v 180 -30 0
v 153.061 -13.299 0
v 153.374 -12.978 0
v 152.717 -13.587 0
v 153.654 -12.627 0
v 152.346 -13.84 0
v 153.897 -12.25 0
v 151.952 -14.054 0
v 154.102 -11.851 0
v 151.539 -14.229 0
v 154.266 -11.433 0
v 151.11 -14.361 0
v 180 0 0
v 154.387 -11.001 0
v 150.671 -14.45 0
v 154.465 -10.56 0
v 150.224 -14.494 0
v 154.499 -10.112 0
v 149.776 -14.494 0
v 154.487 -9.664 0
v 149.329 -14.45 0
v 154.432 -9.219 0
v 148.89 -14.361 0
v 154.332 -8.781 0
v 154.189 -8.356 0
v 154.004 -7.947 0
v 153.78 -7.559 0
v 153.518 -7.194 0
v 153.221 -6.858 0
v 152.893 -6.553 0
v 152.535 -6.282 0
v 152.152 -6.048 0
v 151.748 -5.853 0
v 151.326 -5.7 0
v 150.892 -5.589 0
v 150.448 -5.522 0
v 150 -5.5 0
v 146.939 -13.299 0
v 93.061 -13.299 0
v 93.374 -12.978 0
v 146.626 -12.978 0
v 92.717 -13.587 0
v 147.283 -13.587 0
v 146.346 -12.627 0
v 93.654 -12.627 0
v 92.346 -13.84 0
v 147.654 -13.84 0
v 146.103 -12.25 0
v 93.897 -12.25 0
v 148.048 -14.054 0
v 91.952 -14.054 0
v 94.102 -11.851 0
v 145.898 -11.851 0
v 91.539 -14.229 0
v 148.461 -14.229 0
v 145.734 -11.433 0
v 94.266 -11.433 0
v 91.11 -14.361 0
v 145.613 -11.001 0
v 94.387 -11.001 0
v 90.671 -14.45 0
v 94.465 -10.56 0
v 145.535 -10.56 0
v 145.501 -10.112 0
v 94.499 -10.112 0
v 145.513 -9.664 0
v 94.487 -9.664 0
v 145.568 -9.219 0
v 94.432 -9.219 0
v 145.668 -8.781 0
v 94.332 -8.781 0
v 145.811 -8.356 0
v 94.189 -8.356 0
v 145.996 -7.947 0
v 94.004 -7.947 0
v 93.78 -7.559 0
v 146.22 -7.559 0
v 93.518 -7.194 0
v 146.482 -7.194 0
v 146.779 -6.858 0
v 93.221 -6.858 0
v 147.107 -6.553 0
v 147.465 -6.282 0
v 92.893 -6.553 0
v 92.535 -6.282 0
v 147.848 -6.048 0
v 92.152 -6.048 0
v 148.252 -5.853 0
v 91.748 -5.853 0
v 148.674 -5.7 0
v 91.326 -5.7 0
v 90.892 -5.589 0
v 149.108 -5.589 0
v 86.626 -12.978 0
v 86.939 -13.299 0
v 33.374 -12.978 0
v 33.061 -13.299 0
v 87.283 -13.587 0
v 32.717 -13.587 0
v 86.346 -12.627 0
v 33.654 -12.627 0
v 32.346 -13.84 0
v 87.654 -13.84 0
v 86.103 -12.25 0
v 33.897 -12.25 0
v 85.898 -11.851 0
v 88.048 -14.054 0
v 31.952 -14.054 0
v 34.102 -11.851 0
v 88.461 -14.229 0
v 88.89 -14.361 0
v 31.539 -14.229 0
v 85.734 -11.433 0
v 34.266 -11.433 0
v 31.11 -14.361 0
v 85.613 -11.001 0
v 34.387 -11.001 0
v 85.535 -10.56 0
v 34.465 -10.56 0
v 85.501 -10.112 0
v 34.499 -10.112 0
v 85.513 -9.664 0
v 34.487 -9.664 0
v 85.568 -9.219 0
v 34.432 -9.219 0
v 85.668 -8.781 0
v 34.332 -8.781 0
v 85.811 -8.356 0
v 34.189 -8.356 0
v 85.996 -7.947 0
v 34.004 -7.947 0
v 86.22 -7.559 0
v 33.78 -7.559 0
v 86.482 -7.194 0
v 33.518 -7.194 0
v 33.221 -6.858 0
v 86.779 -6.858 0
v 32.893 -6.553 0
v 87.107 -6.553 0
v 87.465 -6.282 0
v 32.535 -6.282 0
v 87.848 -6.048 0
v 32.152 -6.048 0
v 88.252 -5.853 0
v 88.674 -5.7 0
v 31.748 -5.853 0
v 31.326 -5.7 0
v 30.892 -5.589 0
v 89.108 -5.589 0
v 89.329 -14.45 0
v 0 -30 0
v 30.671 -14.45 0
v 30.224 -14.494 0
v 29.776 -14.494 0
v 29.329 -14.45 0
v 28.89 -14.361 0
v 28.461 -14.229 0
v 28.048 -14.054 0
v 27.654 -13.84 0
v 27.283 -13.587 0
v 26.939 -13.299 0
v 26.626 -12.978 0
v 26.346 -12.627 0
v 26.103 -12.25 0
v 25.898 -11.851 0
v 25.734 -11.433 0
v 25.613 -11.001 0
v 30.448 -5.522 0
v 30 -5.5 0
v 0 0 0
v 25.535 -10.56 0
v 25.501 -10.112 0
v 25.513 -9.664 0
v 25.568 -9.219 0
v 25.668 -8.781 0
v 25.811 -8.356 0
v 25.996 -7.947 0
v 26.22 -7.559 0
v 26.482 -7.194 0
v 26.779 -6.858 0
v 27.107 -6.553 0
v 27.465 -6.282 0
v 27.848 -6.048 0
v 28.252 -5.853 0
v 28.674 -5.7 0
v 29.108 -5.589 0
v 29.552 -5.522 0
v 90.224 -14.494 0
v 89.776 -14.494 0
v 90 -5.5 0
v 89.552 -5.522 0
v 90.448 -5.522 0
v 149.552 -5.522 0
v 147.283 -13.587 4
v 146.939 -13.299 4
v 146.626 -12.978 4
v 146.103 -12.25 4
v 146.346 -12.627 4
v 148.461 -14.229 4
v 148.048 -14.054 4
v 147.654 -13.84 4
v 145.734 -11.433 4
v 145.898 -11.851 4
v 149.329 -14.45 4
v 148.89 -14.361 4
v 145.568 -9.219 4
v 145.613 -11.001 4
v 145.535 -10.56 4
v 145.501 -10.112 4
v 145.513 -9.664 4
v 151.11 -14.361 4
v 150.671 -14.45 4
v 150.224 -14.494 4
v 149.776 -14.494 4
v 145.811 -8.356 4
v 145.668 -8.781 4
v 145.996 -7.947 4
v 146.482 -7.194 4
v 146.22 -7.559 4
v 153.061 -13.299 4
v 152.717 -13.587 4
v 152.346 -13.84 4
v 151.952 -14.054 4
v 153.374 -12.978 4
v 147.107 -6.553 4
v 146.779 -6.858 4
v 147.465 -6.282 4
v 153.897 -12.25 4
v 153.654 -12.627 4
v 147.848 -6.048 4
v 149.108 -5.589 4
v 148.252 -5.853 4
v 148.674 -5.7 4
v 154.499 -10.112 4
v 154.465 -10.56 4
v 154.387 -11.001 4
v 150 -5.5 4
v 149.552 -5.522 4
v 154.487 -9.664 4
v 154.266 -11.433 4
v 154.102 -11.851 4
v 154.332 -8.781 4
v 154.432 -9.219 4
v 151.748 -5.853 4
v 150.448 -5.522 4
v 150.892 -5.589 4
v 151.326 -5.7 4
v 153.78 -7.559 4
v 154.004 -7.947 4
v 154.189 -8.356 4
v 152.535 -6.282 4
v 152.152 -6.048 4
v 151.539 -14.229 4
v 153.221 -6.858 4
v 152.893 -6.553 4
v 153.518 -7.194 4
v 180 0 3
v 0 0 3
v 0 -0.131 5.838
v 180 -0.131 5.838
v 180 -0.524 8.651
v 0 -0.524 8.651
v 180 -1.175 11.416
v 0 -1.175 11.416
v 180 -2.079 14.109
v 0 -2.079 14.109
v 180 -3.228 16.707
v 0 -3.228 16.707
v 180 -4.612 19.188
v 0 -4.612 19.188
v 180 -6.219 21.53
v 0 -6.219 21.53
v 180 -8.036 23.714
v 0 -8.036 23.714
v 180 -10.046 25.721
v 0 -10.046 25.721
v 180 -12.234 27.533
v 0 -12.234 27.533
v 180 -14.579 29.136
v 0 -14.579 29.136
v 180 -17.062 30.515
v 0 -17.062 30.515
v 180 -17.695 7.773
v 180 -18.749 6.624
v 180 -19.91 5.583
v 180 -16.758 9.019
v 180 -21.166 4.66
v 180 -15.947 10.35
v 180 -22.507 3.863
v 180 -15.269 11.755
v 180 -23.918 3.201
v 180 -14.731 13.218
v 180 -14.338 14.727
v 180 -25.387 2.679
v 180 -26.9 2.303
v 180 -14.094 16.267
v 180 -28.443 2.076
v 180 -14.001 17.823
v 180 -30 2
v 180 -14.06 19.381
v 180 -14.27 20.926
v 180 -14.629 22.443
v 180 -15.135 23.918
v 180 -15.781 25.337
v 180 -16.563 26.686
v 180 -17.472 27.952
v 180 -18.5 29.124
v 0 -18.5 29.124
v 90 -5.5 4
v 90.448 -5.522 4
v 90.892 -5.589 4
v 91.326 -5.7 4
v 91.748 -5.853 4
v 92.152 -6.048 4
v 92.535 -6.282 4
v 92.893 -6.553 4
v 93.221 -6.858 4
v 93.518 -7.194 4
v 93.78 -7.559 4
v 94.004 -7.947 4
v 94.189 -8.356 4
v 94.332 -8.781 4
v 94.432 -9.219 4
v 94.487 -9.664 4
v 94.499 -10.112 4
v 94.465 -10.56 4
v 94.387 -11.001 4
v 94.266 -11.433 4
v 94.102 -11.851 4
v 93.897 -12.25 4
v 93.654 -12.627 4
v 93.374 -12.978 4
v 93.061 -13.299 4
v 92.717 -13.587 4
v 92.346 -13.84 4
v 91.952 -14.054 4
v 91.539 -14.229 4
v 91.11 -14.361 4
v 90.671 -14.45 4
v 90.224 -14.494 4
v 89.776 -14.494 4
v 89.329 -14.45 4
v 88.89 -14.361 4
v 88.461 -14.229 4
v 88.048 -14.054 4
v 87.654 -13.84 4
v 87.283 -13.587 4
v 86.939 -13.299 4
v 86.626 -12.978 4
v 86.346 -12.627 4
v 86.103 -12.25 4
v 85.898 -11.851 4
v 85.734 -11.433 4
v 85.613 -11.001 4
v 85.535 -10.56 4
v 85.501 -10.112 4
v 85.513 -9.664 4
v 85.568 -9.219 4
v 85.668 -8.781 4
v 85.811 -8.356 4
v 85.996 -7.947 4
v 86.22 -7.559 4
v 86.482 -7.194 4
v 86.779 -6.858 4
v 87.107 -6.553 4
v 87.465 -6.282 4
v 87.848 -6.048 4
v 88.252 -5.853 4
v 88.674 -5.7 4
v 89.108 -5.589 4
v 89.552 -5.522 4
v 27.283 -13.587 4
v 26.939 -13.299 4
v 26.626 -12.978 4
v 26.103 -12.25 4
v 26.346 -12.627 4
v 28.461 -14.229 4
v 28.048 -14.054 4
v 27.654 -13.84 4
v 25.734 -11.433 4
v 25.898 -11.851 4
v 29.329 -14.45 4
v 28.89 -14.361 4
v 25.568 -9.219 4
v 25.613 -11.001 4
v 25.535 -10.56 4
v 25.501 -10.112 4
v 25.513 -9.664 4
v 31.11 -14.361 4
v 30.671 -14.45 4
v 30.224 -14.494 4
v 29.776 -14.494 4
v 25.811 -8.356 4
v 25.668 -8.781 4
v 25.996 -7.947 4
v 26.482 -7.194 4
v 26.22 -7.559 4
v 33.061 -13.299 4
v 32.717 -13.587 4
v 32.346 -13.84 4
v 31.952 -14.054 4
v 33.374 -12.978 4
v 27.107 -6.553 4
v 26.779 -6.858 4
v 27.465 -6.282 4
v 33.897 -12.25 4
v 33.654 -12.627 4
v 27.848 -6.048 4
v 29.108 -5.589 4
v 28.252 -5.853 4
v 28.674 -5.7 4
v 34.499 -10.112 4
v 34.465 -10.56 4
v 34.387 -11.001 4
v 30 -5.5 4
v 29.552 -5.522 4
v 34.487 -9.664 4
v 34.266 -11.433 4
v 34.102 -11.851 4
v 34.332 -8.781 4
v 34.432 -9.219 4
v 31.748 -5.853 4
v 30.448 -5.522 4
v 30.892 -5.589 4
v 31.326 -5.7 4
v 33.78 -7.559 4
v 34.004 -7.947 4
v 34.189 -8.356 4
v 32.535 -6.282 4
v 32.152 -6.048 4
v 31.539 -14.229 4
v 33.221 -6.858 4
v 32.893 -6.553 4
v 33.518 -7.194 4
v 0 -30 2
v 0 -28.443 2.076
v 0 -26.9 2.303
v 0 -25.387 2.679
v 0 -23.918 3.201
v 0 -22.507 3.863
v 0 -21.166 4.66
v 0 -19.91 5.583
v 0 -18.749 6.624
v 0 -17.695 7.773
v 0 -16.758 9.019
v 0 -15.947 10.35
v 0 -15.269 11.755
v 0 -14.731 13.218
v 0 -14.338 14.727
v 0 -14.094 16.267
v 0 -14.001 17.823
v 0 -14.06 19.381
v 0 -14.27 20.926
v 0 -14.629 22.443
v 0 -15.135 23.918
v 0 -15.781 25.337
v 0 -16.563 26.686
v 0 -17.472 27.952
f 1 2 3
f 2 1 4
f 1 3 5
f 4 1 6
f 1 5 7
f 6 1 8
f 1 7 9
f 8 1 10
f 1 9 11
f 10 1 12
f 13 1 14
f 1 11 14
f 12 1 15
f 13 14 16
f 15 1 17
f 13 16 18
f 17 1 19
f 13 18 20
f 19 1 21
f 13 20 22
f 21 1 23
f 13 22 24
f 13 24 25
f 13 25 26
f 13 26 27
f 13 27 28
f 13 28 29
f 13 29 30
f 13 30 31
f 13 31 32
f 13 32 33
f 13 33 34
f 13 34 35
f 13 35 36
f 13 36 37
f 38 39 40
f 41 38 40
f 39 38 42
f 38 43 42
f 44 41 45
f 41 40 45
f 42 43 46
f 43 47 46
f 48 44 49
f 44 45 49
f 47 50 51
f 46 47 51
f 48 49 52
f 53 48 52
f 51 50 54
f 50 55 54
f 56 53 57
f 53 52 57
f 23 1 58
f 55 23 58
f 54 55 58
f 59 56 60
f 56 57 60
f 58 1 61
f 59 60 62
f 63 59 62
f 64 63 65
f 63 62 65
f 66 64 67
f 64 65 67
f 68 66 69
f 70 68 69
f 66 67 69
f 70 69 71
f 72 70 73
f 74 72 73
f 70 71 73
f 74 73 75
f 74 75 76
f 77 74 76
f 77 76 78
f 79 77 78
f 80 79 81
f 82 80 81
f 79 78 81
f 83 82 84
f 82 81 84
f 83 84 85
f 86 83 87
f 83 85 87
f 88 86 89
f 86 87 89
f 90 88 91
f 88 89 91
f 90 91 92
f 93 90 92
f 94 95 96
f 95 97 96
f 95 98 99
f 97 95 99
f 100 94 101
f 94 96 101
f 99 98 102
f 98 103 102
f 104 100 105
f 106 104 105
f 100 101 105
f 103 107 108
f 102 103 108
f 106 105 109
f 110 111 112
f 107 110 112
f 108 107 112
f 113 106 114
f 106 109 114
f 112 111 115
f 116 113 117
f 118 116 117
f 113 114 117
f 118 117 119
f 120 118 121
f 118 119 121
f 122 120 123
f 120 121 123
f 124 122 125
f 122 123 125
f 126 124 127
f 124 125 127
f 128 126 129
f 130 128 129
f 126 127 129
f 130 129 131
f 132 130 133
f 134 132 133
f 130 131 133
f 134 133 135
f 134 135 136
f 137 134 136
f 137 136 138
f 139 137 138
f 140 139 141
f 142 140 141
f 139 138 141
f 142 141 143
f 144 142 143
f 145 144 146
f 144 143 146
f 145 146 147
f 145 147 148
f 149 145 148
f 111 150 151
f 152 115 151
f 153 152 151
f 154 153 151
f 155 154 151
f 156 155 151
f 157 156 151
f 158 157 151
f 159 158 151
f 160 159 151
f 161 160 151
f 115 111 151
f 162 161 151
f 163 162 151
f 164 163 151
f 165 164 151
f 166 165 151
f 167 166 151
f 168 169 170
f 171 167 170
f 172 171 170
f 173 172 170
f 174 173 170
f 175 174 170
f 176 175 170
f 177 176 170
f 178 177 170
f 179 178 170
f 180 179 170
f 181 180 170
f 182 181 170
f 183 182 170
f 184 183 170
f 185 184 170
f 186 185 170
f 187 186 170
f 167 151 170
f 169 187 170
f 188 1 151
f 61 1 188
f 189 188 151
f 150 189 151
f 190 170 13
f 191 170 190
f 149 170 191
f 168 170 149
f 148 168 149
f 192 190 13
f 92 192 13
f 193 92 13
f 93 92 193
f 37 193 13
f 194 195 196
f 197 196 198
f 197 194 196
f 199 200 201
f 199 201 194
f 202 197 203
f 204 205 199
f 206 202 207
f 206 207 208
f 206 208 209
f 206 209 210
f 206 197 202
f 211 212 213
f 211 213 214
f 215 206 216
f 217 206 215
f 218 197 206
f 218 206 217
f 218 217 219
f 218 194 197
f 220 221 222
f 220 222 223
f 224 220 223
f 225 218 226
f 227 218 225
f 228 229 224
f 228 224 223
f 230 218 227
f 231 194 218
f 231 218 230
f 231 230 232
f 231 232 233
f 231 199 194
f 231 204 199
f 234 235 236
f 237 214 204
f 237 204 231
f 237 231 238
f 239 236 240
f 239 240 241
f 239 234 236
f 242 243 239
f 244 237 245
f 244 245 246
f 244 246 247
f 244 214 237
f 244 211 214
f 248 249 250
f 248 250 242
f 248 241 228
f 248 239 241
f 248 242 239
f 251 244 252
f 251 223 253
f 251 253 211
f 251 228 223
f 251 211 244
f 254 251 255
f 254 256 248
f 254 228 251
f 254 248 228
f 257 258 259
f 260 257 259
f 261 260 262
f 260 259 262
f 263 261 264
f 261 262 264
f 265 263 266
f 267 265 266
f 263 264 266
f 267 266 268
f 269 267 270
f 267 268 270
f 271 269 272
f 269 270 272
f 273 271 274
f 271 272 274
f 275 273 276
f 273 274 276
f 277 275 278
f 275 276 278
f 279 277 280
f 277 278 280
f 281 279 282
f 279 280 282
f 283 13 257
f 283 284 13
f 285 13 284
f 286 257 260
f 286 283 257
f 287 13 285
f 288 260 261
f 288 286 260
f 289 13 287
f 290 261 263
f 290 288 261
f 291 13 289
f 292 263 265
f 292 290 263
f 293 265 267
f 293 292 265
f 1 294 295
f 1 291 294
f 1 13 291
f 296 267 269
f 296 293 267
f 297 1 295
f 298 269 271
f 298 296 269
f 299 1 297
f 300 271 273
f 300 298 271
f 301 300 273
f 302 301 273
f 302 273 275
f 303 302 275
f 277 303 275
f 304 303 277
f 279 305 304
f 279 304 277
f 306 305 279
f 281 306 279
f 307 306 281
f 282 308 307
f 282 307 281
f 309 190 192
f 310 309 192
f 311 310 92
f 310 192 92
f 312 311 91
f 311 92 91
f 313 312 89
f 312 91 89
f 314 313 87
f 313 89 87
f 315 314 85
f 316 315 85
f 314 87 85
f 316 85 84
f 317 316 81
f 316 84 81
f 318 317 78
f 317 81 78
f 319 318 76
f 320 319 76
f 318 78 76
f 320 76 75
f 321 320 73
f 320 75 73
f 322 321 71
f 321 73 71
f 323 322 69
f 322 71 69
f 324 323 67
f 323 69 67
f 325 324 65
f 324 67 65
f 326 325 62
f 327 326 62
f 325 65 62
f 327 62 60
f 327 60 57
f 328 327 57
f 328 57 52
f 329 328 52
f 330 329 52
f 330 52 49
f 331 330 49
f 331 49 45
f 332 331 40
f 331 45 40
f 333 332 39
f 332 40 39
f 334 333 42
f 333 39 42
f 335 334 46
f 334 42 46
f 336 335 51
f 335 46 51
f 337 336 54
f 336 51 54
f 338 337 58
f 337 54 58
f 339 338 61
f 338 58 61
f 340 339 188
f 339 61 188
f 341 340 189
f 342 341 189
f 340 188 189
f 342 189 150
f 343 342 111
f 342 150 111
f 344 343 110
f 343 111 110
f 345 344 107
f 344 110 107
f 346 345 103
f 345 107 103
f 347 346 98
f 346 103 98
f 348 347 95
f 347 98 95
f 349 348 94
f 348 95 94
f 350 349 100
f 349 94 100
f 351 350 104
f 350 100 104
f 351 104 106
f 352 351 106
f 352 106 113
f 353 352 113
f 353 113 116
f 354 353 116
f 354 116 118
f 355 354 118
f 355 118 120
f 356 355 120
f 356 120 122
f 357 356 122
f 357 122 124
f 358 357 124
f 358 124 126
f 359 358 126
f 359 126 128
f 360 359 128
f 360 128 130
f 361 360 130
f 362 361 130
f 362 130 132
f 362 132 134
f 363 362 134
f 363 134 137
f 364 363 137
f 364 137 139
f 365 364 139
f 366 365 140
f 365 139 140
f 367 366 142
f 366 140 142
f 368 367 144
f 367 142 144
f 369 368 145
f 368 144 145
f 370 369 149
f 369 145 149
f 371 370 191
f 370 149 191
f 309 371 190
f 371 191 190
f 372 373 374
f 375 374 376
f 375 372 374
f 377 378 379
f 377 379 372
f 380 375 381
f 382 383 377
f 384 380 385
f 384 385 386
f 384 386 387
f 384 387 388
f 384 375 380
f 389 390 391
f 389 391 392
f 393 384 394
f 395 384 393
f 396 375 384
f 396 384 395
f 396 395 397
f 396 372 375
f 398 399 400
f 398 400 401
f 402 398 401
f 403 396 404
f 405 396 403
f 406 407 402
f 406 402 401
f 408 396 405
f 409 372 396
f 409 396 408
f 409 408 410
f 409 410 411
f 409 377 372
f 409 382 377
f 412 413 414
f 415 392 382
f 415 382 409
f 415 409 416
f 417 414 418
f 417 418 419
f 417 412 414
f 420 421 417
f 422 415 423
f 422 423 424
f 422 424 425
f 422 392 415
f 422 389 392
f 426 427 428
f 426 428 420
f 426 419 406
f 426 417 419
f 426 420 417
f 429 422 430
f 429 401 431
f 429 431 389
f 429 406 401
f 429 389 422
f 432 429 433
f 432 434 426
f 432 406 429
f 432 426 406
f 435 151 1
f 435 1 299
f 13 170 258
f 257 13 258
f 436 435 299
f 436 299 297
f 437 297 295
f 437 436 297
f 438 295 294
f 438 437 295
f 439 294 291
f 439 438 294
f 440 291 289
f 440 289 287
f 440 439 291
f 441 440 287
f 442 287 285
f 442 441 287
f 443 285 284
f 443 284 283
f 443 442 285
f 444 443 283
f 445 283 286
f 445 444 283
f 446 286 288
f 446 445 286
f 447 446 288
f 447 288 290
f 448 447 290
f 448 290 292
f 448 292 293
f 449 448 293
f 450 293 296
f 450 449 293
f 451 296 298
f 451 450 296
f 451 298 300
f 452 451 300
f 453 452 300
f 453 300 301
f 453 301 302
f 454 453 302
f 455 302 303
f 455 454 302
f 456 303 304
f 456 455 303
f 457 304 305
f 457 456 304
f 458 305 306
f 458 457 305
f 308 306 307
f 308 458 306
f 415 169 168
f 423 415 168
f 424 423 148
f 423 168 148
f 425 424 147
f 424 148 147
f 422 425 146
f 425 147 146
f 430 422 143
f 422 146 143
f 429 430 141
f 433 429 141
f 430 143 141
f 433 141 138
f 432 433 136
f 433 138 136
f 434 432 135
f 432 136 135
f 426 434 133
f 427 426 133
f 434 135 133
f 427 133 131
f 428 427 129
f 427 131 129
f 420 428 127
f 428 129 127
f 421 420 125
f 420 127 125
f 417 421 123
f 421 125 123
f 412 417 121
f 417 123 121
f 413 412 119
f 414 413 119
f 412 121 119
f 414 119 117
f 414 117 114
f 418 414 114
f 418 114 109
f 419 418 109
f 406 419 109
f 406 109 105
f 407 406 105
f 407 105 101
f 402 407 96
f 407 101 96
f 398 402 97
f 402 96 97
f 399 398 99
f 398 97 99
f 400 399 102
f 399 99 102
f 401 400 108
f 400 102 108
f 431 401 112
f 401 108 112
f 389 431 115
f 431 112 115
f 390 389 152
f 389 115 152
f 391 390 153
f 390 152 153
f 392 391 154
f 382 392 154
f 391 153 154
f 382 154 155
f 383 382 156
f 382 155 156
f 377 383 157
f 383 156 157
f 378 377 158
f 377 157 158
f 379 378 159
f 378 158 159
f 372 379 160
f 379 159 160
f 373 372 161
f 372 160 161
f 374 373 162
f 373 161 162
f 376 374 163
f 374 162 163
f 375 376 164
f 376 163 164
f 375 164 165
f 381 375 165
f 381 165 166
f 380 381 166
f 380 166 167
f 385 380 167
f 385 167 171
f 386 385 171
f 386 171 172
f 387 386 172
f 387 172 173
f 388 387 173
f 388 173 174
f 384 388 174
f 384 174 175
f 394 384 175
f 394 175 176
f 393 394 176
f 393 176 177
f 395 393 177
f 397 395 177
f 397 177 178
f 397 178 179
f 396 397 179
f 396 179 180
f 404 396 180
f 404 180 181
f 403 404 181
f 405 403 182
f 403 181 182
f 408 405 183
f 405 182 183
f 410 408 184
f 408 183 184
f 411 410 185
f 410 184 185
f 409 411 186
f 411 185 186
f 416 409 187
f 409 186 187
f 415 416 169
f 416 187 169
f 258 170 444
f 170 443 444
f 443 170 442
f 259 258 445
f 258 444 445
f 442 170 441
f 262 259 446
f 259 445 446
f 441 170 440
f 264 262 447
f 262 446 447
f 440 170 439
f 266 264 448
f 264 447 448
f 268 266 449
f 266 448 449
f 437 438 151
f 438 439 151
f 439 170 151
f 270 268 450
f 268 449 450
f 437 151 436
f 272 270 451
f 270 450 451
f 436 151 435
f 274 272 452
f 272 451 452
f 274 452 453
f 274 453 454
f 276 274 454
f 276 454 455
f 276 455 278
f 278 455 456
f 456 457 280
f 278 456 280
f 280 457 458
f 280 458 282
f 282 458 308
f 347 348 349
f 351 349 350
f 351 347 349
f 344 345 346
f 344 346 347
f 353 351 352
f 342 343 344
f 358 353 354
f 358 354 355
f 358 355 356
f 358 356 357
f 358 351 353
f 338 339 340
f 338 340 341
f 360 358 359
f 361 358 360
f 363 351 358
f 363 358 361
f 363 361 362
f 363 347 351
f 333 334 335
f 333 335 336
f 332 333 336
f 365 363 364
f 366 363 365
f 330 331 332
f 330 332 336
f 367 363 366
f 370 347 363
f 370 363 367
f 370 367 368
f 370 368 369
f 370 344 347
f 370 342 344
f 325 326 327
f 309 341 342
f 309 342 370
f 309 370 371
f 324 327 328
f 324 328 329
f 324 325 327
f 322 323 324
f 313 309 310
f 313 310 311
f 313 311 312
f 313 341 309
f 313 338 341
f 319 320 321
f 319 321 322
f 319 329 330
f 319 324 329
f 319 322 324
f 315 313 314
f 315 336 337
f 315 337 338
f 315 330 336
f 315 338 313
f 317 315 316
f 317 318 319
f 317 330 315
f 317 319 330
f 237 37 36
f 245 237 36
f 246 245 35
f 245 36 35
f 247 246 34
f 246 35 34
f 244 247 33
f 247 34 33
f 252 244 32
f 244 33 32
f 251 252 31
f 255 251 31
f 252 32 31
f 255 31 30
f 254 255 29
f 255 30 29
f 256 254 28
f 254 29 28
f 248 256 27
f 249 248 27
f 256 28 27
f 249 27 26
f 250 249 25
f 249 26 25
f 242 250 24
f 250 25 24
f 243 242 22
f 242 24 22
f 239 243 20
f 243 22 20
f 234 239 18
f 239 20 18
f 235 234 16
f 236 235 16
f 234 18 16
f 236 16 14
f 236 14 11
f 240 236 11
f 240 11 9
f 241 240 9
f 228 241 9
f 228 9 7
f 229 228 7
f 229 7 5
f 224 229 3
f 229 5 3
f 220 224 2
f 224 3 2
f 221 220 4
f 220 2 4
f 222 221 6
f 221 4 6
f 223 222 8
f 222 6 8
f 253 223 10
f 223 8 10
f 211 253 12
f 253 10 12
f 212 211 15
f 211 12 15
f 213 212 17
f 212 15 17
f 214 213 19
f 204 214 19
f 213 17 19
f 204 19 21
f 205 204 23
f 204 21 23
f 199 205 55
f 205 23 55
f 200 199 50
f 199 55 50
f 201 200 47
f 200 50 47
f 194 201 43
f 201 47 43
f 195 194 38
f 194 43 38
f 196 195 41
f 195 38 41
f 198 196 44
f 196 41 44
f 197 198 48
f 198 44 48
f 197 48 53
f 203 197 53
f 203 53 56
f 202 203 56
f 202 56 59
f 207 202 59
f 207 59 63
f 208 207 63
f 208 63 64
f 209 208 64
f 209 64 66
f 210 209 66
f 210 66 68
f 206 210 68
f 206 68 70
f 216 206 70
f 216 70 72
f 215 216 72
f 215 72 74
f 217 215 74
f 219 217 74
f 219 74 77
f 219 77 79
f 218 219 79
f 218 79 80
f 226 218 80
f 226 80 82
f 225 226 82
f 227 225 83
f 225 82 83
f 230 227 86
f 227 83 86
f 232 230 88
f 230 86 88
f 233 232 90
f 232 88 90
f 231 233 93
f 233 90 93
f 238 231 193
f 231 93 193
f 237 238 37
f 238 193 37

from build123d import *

# Parameters (mm, degrees)
PAD_DEPTH            = 180
SKETCH001_R          = 4.5
POCKET_DEPTH         = 4
LINEARPATTERN_COUNT  = 3
LINEARPATTERN_PITCH  = 60
BODY_PLACEMENT_ANGLE = 90


with BuildPart() as part:
    # Sketch → Pad (new body)
    with BuildSketch(Plane.YZ):
        with BuildLine():
            Line((0, 30), (0, 0))
            Line((0, 0), (3, 0))
            ThreePointArc((3, 0), (19.18792, 4.611843), (30.514835, 17.0625))
            Line((29.124298, 18.5), (30.514835, 17.0625))
            ThreePointArc((2, 30), (11.754552, 15.269271), (29.124298, 18.5))
            Line((0, 30), (2, 30))
        make_face()
    extrude(amount=PAD_DEPTH)

    # Sketch001 (on Face1 of Pad) → Pocket (cut)
    with BuildSketch(Plane(origin=(0, 0, 0), x_dir=(0, 0, -1), z_dir=(0, -1, 0))):
        with Locations((-10, 30)):
            Circle(SKETCH001_R)
    pocket = extrude(amount=-POCKET_DEPTH, mode=Mode.SUBTRACT)

    # LinearPattern: Pocket ×3
    with Locations(*[(i * LINEARPATTERN_PITCH, 0, 0) for i in range(1, LINEARPATTERN_COUNT)]):
        add(pocket, mode=Mode.SUBTRACT)


with BuildPart() as part_1:
    # Body placement: moved
    add(part.part.rotate(Axis((0, 0, 0), (1, 0, 0)), BODY_PLACEMENT_ANGLE))


solid = part_1.part
